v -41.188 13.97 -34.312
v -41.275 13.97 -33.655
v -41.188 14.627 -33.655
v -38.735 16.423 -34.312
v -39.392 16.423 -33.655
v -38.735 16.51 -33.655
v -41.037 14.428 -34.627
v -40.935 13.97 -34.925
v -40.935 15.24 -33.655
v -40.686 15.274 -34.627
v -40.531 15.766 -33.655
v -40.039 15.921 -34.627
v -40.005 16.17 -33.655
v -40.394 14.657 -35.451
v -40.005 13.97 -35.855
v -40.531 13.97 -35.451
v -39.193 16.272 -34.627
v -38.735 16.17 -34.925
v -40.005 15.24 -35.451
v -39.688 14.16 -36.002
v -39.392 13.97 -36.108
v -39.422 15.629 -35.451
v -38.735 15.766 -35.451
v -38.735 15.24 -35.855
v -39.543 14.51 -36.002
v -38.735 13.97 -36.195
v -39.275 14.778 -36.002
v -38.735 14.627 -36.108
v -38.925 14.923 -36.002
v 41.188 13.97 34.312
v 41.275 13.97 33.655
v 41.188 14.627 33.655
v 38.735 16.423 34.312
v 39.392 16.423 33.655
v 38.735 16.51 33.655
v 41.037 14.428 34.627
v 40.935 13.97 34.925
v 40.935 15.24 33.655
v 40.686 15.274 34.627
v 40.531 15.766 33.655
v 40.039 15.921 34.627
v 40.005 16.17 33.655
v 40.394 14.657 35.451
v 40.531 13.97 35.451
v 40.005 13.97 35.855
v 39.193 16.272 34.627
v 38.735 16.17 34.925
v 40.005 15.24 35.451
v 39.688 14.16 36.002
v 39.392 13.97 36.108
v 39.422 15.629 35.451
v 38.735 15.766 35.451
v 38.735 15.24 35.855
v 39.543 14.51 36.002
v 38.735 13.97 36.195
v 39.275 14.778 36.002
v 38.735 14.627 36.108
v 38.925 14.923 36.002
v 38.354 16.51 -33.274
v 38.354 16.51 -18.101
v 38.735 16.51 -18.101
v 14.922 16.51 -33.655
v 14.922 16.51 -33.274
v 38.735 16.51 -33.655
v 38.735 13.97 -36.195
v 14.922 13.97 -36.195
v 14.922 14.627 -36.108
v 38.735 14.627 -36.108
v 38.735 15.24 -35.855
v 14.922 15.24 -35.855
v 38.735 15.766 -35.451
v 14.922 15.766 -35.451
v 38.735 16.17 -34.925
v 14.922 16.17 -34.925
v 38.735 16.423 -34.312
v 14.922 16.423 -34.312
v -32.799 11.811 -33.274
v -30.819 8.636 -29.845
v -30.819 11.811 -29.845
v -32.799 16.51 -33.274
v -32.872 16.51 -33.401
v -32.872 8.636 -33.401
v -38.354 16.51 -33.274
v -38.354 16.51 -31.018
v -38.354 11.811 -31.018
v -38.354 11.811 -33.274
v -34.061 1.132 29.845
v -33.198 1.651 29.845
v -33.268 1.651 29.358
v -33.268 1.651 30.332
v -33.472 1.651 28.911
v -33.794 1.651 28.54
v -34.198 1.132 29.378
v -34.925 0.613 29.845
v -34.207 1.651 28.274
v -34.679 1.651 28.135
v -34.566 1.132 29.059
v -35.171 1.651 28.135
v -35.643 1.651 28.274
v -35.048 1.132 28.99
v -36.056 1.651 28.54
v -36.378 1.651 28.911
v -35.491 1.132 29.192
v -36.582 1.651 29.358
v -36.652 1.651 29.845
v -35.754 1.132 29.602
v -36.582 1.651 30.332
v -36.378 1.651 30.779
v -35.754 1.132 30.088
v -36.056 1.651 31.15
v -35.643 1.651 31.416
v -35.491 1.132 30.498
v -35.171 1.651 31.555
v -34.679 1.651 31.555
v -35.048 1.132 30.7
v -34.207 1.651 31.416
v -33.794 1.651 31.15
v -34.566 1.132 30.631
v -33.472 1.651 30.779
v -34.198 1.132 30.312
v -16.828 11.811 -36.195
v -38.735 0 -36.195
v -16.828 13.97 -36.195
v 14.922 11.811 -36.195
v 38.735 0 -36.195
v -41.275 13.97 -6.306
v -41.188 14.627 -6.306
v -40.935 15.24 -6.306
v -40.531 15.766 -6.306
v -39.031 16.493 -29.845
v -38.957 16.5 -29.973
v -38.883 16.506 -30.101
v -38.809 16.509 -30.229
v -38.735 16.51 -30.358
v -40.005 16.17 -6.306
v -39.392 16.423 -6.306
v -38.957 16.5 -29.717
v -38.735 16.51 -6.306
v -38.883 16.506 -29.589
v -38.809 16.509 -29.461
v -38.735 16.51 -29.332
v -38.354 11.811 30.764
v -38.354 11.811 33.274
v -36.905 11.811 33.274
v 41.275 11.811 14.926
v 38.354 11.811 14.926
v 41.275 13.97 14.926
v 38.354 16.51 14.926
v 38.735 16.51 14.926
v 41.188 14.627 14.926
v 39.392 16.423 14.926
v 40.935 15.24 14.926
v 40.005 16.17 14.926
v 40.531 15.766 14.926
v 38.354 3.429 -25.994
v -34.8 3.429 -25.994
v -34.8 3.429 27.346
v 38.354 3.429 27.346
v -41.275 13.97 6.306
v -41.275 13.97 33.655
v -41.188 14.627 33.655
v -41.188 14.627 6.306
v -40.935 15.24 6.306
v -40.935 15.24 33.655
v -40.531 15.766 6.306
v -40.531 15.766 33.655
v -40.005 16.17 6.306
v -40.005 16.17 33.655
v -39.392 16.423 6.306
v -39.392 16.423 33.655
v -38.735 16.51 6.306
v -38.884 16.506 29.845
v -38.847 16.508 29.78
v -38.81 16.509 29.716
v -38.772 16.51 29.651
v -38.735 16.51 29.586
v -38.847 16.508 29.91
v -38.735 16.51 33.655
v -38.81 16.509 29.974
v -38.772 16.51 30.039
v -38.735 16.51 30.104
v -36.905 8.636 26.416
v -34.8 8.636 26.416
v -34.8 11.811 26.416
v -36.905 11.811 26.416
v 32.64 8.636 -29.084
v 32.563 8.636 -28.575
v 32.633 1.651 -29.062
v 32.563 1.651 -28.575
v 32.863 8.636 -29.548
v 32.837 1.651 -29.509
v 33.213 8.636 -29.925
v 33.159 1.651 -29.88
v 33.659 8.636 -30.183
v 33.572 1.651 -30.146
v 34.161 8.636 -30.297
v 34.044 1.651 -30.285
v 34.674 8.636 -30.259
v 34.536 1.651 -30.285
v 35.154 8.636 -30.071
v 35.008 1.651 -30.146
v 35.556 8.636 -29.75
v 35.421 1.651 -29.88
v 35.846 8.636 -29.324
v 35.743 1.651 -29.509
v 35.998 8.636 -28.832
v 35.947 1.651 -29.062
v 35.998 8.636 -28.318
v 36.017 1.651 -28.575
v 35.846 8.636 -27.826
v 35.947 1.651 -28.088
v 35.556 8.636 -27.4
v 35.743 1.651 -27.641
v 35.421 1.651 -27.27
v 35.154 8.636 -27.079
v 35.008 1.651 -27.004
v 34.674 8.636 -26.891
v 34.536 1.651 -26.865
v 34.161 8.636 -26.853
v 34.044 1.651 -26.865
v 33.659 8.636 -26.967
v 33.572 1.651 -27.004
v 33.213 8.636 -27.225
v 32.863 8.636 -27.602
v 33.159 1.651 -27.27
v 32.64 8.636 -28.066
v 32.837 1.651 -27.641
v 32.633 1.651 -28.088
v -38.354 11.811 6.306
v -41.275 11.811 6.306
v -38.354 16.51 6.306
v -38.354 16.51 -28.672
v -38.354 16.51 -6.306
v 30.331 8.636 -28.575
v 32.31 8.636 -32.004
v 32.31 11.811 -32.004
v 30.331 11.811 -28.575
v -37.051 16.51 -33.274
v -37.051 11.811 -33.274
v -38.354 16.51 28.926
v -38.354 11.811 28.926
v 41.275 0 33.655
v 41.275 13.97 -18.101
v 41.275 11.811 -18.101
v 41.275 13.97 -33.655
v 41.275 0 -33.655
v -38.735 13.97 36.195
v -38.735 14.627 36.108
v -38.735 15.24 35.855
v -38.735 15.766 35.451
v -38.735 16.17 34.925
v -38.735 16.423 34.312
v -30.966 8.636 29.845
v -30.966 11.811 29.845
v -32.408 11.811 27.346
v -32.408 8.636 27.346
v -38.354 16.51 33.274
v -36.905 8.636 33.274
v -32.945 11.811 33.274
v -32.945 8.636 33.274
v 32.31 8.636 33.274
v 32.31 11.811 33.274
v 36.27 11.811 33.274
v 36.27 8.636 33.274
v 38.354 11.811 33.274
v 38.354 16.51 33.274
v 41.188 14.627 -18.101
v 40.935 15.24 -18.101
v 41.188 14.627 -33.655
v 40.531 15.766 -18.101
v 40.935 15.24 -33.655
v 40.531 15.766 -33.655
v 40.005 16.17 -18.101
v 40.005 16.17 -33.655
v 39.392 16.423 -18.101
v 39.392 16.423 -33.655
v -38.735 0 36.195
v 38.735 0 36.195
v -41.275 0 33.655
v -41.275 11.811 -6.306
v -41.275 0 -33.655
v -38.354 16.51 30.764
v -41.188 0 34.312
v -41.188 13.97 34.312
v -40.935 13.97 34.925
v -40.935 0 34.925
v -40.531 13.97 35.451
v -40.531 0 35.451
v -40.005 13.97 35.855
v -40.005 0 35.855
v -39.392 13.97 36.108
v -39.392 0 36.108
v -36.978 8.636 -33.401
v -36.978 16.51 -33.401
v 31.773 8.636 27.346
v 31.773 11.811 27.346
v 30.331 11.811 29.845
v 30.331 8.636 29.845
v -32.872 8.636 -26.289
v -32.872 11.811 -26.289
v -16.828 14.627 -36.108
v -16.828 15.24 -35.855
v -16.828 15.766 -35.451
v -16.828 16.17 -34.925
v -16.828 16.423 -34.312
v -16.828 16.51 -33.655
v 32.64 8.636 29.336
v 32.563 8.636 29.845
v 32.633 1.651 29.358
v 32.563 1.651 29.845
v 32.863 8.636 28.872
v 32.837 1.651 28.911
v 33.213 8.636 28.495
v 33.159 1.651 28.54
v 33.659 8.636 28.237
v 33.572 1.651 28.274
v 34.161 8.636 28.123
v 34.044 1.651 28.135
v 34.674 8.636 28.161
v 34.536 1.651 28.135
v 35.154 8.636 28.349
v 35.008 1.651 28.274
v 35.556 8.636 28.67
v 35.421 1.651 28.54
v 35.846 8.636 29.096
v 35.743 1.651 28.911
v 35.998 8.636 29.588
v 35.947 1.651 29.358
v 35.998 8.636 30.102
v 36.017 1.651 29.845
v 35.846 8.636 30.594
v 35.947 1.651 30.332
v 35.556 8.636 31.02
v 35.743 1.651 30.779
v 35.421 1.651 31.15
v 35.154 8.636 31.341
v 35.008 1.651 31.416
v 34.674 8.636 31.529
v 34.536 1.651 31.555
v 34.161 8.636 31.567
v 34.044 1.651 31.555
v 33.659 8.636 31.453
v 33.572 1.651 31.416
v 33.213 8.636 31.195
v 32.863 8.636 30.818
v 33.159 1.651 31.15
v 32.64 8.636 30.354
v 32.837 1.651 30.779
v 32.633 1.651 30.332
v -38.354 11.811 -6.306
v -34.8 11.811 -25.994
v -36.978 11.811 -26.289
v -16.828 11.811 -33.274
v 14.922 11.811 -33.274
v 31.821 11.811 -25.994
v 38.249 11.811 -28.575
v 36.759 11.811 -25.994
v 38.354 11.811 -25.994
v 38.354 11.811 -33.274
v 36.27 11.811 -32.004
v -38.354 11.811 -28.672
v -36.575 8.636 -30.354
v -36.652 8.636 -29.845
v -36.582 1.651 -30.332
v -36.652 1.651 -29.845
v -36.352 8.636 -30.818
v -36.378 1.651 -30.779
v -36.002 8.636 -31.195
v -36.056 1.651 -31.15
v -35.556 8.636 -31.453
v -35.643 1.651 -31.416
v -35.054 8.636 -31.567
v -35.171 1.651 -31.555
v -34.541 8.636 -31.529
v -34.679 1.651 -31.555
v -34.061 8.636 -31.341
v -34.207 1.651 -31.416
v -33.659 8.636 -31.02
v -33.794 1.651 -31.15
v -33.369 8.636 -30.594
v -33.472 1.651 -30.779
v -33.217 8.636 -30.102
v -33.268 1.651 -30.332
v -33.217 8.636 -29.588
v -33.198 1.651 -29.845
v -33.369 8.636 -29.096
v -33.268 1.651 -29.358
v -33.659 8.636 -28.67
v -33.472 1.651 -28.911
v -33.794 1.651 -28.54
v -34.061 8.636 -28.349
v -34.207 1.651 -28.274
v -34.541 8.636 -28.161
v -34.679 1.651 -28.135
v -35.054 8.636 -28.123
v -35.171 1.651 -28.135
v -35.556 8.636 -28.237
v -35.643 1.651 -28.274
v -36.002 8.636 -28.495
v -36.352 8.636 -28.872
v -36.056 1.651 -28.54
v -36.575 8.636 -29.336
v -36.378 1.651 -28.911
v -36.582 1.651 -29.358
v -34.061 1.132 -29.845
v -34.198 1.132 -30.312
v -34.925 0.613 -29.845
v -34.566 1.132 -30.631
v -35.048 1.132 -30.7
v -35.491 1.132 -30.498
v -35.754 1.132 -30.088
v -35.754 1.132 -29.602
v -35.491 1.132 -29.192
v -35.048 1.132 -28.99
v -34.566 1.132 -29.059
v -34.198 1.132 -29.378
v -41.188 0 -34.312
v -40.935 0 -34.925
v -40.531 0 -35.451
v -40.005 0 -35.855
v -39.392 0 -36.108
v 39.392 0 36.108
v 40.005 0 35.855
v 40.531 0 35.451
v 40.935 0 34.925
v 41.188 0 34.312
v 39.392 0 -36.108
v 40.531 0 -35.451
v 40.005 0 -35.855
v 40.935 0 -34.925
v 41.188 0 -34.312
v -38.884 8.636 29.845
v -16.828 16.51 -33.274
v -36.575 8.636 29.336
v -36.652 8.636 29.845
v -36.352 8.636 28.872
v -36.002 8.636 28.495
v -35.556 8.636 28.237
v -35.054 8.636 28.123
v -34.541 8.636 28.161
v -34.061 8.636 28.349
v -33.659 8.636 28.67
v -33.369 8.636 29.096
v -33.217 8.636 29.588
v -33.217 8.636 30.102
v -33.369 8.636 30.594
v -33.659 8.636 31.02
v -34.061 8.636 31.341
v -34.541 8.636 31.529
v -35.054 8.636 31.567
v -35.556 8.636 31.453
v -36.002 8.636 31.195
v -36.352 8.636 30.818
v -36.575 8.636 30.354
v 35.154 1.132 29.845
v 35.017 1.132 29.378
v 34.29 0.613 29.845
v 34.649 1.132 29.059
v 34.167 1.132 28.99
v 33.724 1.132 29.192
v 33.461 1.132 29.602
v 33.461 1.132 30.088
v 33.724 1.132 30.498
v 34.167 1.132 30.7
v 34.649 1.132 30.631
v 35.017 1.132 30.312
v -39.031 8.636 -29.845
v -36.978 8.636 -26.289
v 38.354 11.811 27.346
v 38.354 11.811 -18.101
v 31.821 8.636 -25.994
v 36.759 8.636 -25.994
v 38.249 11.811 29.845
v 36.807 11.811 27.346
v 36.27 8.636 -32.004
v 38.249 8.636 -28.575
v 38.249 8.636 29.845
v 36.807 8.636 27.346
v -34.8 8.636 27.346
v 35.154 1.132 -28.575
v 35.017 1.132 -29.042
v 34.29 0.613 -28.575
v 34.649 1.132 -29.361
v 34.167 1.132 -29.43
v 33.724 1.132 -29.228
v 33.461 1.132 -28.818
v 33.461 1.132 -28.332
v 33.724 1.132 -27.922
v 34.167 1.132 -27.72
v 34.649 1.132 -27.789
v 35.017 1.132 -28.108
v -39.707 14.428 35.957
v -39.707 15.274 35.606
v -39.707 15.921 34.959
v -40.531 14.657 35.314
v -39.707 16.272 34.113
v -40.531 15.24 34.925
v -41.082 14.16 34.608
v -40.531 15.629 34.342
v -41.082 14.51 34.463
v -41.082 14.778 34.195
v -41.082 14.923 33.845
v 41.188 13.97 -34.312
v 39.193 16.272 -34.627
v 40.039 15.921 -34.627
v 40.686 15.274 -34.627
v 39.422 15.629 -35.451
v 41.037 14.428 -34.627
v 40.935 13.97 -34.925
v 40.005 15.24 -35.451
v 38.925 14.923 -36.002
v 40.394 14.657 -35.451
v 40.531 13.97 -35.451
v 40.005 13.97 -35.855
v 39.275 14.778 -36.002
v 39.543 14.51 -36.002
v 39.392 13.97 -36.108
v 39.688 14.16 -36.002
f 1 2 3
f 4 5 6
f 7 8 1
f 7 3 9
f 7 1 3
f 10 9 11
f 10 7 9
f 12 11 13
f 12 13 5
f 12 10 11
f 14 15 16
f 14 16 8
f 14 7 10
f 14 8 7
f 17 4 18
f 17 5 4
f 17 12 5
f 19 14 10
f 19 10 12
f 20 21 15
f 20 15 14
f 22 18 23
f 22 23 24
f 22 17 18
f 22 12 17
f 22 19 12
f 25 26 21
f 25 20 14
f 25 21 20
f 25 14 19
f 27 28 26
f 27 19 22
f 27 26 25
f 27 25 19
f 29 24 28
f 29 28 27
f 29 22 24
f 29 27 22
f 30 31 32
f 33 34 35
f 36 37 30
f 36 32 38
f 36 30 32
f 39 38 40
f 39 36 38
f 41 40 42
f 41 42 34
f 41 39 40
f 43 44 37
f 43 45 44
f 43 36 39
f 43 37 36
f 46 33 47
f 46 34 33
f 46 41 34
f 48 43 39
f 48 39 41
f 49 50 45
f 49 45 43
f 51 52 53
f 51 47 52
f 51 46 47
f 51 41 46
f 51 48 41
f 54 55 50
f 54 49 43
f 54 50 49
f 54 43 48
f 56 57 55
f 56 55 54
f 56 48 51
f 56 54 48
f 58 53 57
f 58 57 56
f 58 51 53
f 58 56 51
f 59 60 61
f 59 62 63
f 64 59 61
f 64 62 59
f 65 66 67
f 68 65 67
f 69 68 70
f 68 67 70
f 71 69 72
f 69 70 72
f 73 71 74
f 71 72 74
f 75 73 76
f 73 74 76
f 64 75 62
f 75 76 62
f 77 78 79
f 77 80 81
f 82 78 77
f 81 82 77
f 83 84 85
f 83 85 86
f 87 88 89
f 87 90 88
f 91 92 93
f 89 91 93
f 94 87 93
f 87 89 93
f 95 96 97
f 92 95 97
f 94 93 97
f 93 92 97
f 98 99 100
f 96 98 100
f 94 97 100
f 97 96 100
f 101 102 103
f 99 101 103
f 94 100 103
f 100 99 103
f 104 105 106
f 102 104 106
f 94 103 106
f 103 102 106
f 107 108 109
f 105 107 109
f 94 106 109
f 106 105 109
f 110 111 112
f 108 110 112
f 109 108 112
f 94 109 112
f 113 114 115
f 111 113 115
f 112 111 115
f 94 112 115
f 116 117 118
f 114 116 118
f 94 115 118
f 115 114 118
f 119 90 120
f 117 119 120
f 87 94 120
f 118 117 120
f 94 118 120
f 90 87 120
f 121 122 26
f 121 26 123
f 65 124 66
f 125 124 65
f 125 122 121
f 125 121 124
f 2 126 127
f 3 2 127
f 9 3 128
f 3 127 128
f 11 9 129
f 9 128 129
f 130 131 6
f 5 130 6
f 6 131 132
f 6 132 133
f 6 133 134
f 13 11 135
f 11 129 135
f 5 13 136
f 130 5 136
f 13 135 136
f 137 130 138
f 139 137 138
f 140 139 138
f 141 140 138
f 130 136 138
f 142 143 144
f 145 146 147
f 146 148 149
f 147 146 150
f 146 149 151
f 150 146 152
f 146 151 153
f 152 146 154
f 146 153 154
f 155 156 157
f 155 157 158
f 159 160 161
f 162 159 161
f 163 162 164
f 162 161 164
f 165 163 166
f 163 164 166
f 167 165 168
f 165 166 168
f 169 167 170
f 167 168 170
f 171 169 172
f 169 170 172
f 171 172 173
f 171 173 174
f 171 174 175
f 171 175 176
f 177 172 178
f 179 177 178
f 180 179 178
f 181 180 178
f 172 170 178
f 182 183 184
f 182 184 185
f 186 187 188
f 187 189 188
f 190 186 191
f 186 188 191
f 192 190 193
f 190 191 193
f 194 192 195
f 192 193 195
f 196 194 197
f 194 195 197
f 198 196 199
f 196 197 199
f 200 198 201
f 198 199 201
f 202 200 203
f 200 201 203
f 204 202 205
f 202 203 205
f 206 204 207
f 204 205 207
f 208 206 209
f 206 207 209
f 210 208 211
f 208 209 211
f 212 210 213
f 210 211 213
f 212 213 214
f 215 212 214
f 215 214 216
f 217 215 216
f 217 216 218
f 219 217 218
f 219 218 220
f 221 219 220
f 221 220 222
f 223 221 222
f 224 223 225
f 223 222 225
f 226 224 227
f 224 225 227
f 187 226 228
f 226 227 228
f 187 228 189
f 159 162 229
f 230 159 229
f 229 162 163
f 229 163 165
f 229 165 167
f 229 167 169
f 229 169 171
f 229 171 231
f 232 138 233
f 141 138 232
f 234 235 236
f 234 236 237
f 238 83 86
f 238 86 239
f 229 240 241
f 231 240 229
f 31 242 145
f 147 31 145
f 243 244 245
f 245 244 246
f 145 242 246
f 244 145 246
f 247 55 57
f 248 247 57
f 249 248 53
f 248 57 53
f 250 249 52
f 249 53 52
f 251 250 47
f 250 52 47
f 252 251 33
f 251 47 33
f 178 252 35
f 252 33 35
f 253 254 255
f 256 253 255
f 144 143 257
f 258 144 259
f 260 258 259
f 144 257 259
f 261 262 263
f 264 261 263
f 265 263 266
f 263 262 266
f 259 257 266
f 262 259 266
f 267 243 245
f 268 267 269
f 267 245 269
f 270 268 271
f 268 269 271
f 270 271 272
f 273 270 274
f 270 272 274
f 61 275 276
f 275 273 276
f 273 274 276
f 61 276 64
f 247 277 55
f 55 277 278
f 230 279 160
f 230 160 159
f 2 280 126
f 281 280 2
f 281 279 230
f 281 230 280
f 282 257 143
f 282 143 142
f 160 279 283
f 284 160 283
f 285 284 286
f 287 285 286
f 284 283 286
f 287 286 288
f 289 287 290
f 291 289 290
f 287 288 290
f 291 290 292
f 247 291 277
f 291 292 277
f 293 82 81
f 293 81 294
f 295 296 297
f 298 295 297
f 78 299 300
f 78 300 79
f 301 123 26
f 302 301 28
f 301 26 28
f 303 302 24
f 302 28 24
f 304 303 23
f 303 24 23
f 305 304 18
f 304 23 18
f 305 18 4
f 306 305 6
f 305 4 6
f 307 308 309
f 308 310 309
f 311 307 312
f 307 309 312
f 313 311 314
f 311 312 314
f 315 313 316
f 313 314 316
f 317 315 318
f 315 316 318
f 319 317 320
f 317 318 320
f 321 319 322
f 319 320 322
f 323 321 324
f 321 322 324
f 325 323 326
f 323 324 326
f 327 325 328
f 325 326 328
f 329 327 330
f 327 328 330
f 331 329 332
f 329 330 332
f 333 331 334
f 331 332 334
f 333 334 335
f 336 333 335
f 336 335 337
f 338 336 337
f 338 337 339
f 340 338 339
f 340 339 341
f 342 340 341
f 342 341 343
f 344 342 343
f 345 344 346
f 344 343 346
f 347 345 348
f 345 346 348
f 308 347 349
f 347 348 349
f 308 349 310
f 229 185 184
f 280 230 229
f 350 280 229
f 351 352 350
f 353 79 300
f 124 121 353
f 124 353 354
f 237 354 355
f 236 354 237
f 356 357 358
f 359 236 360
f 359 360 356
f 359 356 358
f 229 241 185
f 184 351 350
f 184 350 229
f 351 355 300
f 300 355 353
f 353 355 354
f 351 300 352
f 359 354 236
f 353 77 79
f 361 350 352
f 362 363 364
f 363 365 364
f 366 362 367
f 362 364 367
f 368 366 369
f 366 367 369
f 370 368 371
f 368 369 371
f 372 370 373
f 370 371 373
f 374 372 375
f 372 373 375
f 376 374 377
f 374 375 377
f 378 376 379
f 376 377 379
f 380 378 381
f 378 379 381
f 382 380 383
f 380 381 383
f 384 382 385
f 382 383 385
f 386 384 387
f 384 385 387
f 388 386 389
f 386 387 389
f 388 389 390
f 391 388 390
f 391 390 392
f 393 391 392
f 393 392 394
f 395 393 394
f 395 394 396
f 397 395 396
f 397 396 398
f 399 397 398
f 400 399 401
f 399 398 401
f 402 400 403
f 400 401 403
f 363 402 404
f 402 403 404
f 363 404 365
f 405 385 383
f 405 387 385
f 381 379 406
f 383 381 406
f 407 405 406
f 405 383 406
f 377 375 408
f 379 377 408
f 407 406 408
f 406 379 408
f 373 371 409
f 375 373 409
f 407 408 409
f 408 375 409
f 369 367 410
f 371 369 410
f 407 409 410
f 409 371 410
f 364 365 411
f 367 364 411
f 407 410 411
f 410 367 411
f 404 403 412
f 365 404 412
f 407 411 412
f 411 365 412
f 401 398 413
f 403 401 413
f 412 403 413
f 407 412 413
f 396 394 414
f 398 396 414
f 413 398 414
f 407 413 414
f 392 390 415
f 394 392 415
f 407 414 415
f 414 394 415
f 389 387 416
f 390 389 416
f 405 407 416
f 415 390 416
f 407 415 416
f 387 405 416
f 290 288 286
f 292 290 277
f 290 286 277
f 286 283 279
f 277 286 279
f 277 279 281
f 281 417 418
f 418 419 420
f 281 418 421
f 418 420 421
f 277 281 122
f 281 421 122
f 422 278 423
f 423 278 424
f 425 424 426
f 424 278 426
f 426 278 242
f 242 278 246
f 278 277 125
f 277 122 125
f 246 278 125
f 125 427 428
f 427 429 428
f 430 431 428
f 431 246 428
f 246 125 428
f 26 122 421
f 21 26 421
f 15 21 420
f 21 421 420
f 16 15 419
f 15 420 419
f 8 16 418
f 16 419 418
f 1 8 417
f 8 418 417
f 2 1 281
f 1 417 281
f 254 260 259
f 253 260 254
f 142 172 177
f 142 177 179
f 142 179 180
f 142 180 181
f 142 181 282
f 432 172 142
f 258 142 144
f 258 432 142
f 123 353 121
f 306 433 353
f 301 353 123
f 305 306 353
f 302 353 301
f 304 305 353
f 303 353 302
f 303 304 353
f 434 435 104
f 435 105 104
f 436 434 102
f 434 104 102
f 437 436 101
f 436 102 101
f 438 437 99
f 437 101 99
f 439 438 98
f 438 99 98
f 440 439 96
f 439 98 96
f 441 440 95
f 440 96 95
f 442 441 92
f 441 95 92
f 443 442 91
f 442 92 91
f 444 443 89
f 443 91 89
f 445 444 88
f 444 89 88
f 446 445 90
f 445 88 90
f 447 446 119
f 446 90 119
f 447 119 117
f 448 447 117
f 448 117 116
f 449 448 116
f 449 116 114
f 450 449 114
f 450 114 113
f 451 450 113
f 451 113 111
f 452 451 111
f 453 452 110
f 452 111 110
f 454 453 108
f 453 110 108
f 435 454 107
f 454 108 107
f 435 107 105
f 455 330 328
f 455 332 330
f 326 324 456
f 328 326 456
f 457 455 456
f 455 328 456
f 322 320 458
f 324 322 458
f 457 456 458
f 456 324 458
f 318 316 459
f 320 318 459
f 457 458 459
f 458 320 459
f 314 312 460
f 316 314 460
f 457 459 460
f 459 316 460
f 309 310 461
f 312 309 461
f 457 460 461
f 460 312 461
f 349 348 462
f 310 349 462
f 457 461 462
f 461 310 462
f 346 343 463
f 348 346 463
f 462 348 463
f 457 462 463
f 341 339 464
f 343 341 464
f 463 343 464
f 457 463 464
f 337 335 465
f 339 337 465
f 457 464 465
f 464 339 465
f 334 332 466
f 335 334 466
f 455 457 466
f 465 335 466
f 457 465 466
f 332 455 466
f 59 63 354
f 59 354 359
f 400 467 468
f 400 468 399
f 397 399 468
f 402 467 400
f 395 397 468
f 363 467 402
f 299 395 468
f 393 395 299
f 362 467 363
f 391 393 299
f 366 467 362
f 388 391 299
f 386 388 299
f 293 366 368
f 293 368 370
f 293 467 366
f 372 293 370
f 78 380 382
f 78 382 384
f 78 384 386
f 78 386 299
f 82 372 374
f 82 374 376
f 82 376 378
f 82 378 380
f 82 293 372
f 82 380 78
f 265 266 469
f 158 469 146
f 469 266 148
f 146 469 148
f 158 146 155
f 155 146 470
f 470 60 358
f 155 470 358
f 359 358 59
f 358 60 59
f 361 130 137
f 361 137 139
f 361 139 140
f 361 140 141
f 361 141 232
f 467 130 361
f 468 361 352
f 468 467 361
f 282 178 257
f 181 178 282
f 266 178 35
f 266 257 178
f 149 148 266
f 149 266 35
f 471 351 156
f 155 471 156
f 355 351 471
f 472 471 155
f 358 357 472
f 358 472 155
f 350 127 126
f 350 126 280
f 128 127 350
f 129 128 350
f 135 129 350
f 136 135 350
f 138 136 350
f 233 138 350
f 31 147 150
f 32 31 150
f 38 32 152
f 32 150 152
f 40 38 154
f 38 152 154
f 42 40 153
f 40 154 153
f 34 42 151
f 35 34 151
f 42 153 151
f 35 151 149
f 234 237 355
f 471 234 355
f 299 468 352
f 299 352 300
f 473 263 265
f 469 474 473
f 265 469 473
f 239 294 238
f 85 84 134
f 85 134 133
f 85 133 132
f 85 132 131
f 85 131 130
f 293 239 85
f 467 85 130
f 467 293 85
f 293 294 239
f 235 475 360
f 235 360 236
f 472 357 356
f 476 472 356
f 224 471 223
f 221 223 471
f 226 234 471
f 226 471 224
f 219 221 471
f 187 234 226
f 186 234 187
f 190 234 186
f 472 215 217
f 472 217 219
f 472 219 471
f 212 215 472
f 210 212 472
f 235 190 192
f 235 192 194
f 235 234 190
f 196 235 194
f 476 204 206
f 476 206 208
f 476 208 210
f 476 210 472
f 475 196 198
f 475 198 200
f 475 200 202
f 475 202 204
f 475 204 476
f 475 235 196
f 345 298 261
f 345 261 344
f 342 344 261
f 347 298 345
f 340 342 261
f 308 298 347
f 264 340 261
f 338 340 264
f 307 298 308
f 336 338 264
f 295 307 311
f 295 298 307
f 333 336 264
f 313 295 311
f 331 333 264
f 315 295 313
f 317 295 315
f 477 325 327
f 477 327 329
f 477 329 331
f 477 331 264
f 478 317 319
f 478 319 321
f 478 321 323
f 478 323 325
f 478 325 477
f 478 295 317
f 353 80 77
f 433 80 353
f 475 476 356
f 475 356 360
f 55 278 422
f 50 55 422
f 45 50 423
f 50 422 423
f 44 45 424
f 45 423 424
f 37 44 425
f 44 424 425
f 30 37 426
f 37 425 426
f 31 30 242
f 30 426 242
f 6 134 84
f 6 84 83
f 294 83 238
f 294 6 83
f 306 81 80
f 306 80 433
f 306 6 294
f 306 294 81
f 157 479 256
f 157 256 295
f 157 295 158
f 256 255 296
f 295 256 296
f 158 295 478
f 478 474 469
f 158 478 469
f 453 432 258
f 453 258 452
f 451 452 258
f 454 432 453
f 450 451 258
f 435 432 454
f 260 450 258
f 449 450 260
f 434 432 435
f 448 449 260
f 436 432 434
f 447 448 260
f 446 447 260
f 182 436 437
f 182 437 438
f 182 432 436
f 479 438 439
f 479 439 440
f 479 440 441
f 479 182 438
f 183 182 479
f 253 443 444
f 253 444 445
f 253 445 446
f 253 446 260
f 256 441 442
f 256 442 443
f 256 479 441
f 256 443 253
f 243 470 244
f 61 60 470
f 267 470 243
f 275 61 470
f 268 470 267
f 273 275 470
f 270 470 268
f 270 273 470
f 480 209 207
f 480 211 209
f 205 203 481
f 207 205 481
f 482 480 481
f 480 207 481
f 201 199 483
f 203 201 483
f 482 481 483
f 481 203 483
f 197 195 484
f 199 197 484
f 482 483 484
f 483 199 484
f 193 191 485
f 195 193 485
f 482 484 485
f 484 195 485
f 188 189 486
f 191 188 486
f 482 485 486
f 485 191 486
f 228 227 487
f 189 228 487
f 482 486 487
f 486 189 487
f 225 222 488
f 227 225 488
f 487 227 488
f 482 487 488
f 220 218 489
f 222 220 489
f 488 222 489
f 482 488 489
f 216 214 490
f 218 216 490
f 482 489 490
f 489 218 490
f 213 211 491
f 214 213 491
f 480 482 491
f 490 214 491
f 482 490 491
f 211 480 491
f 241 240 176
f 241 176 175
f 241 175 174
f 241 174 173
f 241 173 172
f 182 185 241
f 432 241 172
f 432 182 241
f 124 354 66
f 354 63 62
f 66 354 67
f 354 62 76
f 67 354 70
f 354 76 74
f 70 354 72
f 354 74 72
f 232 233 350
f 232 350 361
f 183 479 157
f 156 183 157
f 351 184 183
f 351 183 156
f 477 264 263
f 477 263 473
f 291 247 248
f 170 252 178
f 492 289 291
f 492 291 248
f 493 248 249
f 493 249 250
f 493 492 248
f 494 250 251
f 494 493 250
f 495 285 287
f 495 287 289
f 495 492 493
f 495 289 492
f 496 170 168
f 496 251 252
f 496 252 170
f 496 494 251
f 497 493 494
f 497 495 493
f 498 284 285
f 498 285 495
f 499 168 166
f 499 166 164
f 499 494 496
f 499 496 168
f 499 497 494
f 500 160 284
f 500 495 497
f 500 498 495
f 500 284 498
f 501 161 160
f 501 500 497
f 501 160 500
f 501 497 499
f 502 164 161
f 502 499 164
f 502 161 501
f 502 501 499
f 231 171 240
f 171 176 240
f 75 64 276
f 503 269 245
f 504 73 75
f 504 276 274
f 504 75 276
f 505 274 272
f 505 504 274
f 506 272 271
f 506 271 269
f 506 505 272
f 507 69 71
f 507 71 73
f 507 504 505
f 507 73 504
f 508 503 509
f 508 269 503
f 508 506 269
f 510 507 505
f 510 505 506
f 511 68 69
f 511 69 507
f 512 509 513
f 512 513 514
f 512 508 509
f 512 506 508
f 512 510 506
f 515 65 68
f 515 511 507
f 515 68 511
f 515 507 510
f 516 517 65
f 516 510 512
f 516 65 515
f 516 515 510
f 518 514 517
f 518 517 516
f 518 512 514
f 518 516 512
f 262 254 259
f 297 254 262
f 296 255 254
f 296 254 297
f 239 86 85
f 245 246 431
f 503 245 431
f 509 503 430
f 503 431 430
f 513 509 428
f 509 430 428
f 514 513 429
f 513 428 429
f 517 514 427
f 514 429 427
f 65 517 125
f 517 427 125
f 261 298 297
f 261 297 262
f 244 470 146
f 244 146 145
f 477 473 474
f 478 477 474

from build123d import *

# Parameters (mm, degrees)
SKETCH1_W                 = 82.55
SKETCH1_H                 = 72.39
BOSS_EXTRUDE1_DEPTH       = 16.51
SKETCH3_W                 = 76.708
SKETCH3_H                 = 66.548
CUT_EXTRUDE1_DEPTH        = 4.699
F_4_CLEARANCE_HOLE1_D     = 3.4544
F_4_CLEARANCE_HOLE1_DEPTH = 10.16
F_4_CLEARANCE_HOLE1_TIP   = 1.037806461
CUT_EXTRUDE2_DEPTH        = 8.255
CUT_EXTRUDE2_DEPTH_BACK   = 3.175
SKETCH9_W                 = 73.153706622
SKETCH9_H                 = 53.34
CUT_EXTRUDE3_DEPTH        = 8.382
SKETCH12_W                = 10.829569732
SKETCH12_H                = 12.611774214
SKETCH12_W_2              = 17.214227743
SKETCH12_H_2              = 33.027302542
SKETCH12_W_3              = 31.75
SKETCH12_H_3              = 19.685
CUT_EXTRUDE8_DEPTH        = 4.699
FILLET1_R                 = 2.54


with BuildPart() as part:
    # Sketch1 → Boss-Extrude1 (new body)
    with BuildSketch(Plane(origin=(0, 0, 0), x_dir=(1, 0, 0), z_dir=(0, 1, 0))):
        Rectangle(SKETCH1_W, SKETCH1_H)
    extrude(amount=BOSS_EXTRUDE1_DEPTH)

    # Sketch3 → Cut-Extrude1 (cut)
    with BuildSketch(Plane(origin=(0, 16.51, 0), x_dir=(1, 0, 0), z_dir=(0, 1, 0))):
        Rectangle(SKETCH3_W, SKETCH3_H)
    extrude(amount=-CUT_EXTRUDE1_DEPTH, mode=Mode.SUBTRACT)

    # #4 Clearance Hole1
    with Locations(Plane(origin=(0, 11.811, 0), x_dir=(1, 0, 0), z_dir=(0, 1, 0))):
        with Locations((-34.925, 29.845), (34.29, 28.575), (34.29, -29.845), (-34.925, -29.845)):
            Hole(F_4_CLEARANCE_HOLE1_D / 2, depth=F_4_CLEARANCE_HOLE1_DEPTH)
            with Locations((0, 0, -(F_4_CLEARANCE_HOLE1_DEPTH + F_4_CLEARANCE_HOLE1_TIP / 2))):  # 118° drill point
                Cone(0, F_4_CLEARANCE_HOLE1_D / 2, F_4_CLEARANCE_HOLE1_TIP, mode=Mode.SUBTRACT)

    # Sketch8 → Cut-Extrude2 (cut, two sides: drawn at the far end of the back side and taken through both)
    with BuildSketch(Plane(origin=(0, 11.811, 0), x_dir=(1, 0, 0), z_dir=(0, 1, 0)).offset(-CUT_EXTRUDE2_DEPTH_BACK)):
        Polygon((38.249468146, -29.845), (36.269734073, -26.416), (32.310265927, -26.416), (30.330531854, -29.845), (32.310265927, -33.274), (36.269734073, -33.274), align=None)
        Polygon((-30.818884886, 29.845), (-32.871942443, 33.401), (-36.978057557, 33.401), (-39.031115114, 29.845), (-36.978057557, 26.289), (-32.871942443, 26.289), align=None)
        Polygon((38.249468146, 28.575), (36.269734073, 32.004), (32.310265927, 32.004), (30.330531854, 28.575), (32.310265927, 25.146), (36.269734073, 25.146), align=None)
        Polygon((-30.965531854, -29.845), (-32.945265927, -26.416), (-36.904734073, -26.416), (-38.884468146, -29.845), (-36.904734073, -33.274), (-32.945265927, -33.274), align=None)
    extrude(amount=CUT_EXTRUDE2_DEPTH + CUT_EXTRUDE2_DEPTH_BACK, mode=Mode.SUBTRACT)

    # Sketch9 → Cut-Extrude3 (cut)
    with BuildSketch(Plane(origin=(0, 11.811, 0), x_dir=(1, 0, 0), z_dir=(0, 1, 0))):
        with Locations((1.777146689, -0.675914663)):
            Rectangle(SKETCH9_W, SKETCH9_H)
    extrude(amount=-CUT_EXTRUDE3_DEPTH, mode=Mode.SUBTRACT)

    # Sketch12 → Cut-Extrude8 (cut)
    with BuildSketch(Plane(origin=(0, 16.51, 0), x_dir=(1, 0, 0), z_dir=(0, 1, 0))):
        with Locations((-35.860215134, 0)):
            Rectangle(SKETCH12_W, SKETCH12_H)
        with Locations((32.667886129, 1.587498929)):
            Rectangle(SKETCH12_W_2, SKETCH12_H_2)
        with Locations((-0.9525, 26.3525)):
            Rectangle(SKETCH12_W_3, SKETCH12_H_3)
    extrude(amount=-CUT_EXTRUDE8_DEPTH, mode=Mode.SUBTRACT)

    # Fillet1
    # the kernel refuses this fillet: 2.54 mm, written as the material it takes off along each edge
    with BuildSketch(Plane(origin=(38.735, 13.97, 33.655), x_dir=(0, 1, 0), z_dir=(0, 0, 1))) as fillet1_piece_1_section:
        Polygon((0, 0), (FILLET1_R, 0), (FILLET1_R, -FILLET1_R), (0, -FILLET1_R), align=None)
    fillet1_piece_1 = extrude(amount=FILLET1_R, mode=Mode.PRIVATE)
    fillet1_piece_1 = fillet1_piece_1 - Plane(origin=(38.735, 13.97, 33.655), x_dir=(-0.7071067811865475, -0.7071067811865475, 0), z_dir=(0, 0, 1)) * Sphere(FILLET1_R, mode=Mode.PRIVATE)
    add(fillet1_piece_1, mode=Mode.SUBTRACT)
    with BuildSketch(Plane(origin=(38.735, 13.97, -33.655), x_dir=(0, 1, 0), z_dir=(0, 0, -1))) as fillet1_piece_2_section:
        Polygon((0, 0), (FILLET1_R, 0), (FILLET1_R, FILLET1_R), (0, FILLET1_R), align=None)
    fillet1_piece_2 = extrude(amount=FILLET1_R, mode=Mode.PRIVATE)
    fillet1_piece_2 = fillet1_piece_2 - Plane(origin=(38.735, 13.97, -33.655), x_dir=(-0.7071067811865475, -0.7071067811865475, 0), z_dir=(0, 0, -1)) * Sphere(FILLET1_R, mode=Mode.PRIVATE)
    add(fillet1_piece_2, mode=Mode.SUBTRACT)
    with BuildSketch(Plane(origin=(-38.735, 13.97, 33.655), x_dir=(0, 0, 1), z_dir=(-1, 0, 0))) as fillet1_piece_3_section:
        Polygon((0, 0), (FILLET1_R, 0), (FILLET1_R, FILLET1_R), (0, FILLET1_R), align=None)
    fillet1_piece_3 = extrude(amount=FILLET1_R, mode=Mode.PRIVATE)
    fillet1_piece_3 = fillet1_piece_3 - Plane(origin=(-38.735, 13.97, 33.655), x_dir=(0, -0.7071067811865475, -0.7071067811865475), z_dir=(-1, 0, 0)) * Sphere(FILLET1_R, mode=Mode.PRIVATE)
    add(fillet1_piece_3, mode=Mode.SUBTRACT)
    with BuildSketch(Plane(origin=(-38.735, 13.97, -33.655), x_dir=(-1, 0, 0), z_dir=(0, 0, -1))) as fillet1_piece_4_section:
        Polygon((0, 0), (FILLET1_R, 0), (FILLET1_R, FILLET1_R), (0, FILLET1_R), align=None)
    fillet1_piece_4 = extrude(amount=FILLET1_R, mode=Mode.PRIVATE)
    fillet1_piece_4 = fillet1_piece_4 - Plane(origin=(-38.735, 13.97, -33.655), x_dir=(0.7071067811865475, -0.7071067811865475, 0), z_dir=(0, 0, -1)) * Sphere(FILLET1_R, mode=Mode.PRIVATE)
    add(fillet1_piece_4, mode=Mode.SUBTRACT)
    with BuildSketch(Plane(origin=(41.275, 16.51, 8.576152342), x_dir=(-1, 0, 0), z_dir=(0, 0, 1))) as fillet1_piece_5:
        with BuildLine():
            CenterArc((FILLET1_R, FILLET1_R), FILLET1_R, 180, 90)
            Line((0, FILLET1_R), (0, 0))
            Line((0, 0), (FILLET1_R, 0))
        make_face()
    extrude(amount=25.078847658, mode=Mode.SUBTRACT)
    with BuildSketch(Plane(origin=(8.5725, 16.51, -36.195), x_dir=(0, -1, 0), z_dir=(1, 0, 0))) as fillet1_piece_6:
        with BuildLine():
            CenterArc((FILLET1_R, -FILLET1_R), FILLET1_R, 90, 90)
            Line((0, -FILLET1_R), (0, 0))
            Line((0, 0), (FILLET1_R, 0))
        make_face()
    extrude(amount=30.1625, mode=Mode.SUBTRACT)
    with BuildSketch(Plane(origin=(-41.275, 16.51, 33.655), x_dir=(0, -1, 0), z_dir=(0, 0, -1)), Plane(origin=(-41.275, 16.51, 0.044112893), x_dir=(0, -1, 0), z_dir=(0, 0, -1))) as fillet1_piece_7:
        with BuildLine():
            CenterArc((FILLET1_R, -FILLET1_R), FILLET1_R, 90, 90)
            Line((0, -FILLET1_R), (0, 0))
            Line((0, 0), (FILLET1_R, 0))
        make_face()
    extrude(amount=33.699112893, mode=Mode.SUBTRACT)
    with BuildSketch(Plane(origin=(41.275, 16.51, -33.655), x_dir=(-1, 0, 0), z_dir=(0, 0, 1))) as fillet1_piece_8:
        with BuildLine():
            CenterArc((FILLET1_R, FILLET1_R), FILLET1_R, 180, 90)
            Line((0, FILLET1_R), (0, 0))
            Line((0, 0), (FILLET1_R, 0))
        make_face()
    extrude(amount=21.9038498, mode=Mode.SUBTRACT)
    with BuildSketch(Plane(origin=(-38.735, 16.51, -36.195), x_dir=(0, -1, 0), z_dir=(1, 0, 0))) as fillet1_piece_9:
        with BuildLine():
            CenterArc((FILLET1_R, -FILLET1_R), FILLET1_R, 90, 90)
            Line((0, -FILLET1_R), (0, 0))
            Line((0, 0), (FILLET1_R, 0))
        make_face()
    extrude(amount=28.2575, mode=Mode.SUBTRACT)
    with BuildSketch(Plane(origin=(38.735, 16.51, 36.195), x_dir=(0, -1, 0), z_dir=(-1, 0, 0))) as fillet1_piece_10:
        with BuildLine():
            CenterArc((FILLET1_R, -FILLET1_R), FILLET1_R, 90, 90)
            Line((0, -FILLET1_R), (0, 0))
            Line((0, 0), (FILLET1_R, 0))
        make_face()
    extrude(amount=77.47, mode=Mode.SUBTRACT)
    with BuildSketch(Plane(origin=(-41.275, -6.35, -36.195), x_dir=(1, 0, 0), z_dir=(0, 1, 0)), Plane(origin=(41.275, -6.35, 36.195), x_dir=(-1, 0, 0), z_dir=(0, 1, 0)), Plane(origin=(-41.275, -6.35, 36.195), x_dir=(0, 0, -1), z_dir=(0, 1, 0))) as fillet1_piece_11:
        with BuildLine():
            CenterArc((FILLET1_R, -FILLET1_R), FILLET1_R, 90, 90)
            Line((0, -FILLET1_R), (0, 0))
            Line((0, 0), (FILLET1_R, 0))
        make_face()
    extrude(amount=20.32, mode=Mode.SUBTRACT)
    with BuildSketch(Plane(origin=(41.275, -6.35, -36.195), x_dir=(-1, 0, 0), z_dir=(0, 1, 0))) as fillet1_piece_12:
        with BuildLine():
            CenterArc((FILLET1_R, FILLET1_R), FILLET1_R, 180, 90)
            Line((0, FILLET1_R), (0, 0))
            Line((0, 0), (FILLET1_R, 0))
        make_face()
    extrude(amount=20.32, mode=Mode.SUBTRACT)


solid = part.part
